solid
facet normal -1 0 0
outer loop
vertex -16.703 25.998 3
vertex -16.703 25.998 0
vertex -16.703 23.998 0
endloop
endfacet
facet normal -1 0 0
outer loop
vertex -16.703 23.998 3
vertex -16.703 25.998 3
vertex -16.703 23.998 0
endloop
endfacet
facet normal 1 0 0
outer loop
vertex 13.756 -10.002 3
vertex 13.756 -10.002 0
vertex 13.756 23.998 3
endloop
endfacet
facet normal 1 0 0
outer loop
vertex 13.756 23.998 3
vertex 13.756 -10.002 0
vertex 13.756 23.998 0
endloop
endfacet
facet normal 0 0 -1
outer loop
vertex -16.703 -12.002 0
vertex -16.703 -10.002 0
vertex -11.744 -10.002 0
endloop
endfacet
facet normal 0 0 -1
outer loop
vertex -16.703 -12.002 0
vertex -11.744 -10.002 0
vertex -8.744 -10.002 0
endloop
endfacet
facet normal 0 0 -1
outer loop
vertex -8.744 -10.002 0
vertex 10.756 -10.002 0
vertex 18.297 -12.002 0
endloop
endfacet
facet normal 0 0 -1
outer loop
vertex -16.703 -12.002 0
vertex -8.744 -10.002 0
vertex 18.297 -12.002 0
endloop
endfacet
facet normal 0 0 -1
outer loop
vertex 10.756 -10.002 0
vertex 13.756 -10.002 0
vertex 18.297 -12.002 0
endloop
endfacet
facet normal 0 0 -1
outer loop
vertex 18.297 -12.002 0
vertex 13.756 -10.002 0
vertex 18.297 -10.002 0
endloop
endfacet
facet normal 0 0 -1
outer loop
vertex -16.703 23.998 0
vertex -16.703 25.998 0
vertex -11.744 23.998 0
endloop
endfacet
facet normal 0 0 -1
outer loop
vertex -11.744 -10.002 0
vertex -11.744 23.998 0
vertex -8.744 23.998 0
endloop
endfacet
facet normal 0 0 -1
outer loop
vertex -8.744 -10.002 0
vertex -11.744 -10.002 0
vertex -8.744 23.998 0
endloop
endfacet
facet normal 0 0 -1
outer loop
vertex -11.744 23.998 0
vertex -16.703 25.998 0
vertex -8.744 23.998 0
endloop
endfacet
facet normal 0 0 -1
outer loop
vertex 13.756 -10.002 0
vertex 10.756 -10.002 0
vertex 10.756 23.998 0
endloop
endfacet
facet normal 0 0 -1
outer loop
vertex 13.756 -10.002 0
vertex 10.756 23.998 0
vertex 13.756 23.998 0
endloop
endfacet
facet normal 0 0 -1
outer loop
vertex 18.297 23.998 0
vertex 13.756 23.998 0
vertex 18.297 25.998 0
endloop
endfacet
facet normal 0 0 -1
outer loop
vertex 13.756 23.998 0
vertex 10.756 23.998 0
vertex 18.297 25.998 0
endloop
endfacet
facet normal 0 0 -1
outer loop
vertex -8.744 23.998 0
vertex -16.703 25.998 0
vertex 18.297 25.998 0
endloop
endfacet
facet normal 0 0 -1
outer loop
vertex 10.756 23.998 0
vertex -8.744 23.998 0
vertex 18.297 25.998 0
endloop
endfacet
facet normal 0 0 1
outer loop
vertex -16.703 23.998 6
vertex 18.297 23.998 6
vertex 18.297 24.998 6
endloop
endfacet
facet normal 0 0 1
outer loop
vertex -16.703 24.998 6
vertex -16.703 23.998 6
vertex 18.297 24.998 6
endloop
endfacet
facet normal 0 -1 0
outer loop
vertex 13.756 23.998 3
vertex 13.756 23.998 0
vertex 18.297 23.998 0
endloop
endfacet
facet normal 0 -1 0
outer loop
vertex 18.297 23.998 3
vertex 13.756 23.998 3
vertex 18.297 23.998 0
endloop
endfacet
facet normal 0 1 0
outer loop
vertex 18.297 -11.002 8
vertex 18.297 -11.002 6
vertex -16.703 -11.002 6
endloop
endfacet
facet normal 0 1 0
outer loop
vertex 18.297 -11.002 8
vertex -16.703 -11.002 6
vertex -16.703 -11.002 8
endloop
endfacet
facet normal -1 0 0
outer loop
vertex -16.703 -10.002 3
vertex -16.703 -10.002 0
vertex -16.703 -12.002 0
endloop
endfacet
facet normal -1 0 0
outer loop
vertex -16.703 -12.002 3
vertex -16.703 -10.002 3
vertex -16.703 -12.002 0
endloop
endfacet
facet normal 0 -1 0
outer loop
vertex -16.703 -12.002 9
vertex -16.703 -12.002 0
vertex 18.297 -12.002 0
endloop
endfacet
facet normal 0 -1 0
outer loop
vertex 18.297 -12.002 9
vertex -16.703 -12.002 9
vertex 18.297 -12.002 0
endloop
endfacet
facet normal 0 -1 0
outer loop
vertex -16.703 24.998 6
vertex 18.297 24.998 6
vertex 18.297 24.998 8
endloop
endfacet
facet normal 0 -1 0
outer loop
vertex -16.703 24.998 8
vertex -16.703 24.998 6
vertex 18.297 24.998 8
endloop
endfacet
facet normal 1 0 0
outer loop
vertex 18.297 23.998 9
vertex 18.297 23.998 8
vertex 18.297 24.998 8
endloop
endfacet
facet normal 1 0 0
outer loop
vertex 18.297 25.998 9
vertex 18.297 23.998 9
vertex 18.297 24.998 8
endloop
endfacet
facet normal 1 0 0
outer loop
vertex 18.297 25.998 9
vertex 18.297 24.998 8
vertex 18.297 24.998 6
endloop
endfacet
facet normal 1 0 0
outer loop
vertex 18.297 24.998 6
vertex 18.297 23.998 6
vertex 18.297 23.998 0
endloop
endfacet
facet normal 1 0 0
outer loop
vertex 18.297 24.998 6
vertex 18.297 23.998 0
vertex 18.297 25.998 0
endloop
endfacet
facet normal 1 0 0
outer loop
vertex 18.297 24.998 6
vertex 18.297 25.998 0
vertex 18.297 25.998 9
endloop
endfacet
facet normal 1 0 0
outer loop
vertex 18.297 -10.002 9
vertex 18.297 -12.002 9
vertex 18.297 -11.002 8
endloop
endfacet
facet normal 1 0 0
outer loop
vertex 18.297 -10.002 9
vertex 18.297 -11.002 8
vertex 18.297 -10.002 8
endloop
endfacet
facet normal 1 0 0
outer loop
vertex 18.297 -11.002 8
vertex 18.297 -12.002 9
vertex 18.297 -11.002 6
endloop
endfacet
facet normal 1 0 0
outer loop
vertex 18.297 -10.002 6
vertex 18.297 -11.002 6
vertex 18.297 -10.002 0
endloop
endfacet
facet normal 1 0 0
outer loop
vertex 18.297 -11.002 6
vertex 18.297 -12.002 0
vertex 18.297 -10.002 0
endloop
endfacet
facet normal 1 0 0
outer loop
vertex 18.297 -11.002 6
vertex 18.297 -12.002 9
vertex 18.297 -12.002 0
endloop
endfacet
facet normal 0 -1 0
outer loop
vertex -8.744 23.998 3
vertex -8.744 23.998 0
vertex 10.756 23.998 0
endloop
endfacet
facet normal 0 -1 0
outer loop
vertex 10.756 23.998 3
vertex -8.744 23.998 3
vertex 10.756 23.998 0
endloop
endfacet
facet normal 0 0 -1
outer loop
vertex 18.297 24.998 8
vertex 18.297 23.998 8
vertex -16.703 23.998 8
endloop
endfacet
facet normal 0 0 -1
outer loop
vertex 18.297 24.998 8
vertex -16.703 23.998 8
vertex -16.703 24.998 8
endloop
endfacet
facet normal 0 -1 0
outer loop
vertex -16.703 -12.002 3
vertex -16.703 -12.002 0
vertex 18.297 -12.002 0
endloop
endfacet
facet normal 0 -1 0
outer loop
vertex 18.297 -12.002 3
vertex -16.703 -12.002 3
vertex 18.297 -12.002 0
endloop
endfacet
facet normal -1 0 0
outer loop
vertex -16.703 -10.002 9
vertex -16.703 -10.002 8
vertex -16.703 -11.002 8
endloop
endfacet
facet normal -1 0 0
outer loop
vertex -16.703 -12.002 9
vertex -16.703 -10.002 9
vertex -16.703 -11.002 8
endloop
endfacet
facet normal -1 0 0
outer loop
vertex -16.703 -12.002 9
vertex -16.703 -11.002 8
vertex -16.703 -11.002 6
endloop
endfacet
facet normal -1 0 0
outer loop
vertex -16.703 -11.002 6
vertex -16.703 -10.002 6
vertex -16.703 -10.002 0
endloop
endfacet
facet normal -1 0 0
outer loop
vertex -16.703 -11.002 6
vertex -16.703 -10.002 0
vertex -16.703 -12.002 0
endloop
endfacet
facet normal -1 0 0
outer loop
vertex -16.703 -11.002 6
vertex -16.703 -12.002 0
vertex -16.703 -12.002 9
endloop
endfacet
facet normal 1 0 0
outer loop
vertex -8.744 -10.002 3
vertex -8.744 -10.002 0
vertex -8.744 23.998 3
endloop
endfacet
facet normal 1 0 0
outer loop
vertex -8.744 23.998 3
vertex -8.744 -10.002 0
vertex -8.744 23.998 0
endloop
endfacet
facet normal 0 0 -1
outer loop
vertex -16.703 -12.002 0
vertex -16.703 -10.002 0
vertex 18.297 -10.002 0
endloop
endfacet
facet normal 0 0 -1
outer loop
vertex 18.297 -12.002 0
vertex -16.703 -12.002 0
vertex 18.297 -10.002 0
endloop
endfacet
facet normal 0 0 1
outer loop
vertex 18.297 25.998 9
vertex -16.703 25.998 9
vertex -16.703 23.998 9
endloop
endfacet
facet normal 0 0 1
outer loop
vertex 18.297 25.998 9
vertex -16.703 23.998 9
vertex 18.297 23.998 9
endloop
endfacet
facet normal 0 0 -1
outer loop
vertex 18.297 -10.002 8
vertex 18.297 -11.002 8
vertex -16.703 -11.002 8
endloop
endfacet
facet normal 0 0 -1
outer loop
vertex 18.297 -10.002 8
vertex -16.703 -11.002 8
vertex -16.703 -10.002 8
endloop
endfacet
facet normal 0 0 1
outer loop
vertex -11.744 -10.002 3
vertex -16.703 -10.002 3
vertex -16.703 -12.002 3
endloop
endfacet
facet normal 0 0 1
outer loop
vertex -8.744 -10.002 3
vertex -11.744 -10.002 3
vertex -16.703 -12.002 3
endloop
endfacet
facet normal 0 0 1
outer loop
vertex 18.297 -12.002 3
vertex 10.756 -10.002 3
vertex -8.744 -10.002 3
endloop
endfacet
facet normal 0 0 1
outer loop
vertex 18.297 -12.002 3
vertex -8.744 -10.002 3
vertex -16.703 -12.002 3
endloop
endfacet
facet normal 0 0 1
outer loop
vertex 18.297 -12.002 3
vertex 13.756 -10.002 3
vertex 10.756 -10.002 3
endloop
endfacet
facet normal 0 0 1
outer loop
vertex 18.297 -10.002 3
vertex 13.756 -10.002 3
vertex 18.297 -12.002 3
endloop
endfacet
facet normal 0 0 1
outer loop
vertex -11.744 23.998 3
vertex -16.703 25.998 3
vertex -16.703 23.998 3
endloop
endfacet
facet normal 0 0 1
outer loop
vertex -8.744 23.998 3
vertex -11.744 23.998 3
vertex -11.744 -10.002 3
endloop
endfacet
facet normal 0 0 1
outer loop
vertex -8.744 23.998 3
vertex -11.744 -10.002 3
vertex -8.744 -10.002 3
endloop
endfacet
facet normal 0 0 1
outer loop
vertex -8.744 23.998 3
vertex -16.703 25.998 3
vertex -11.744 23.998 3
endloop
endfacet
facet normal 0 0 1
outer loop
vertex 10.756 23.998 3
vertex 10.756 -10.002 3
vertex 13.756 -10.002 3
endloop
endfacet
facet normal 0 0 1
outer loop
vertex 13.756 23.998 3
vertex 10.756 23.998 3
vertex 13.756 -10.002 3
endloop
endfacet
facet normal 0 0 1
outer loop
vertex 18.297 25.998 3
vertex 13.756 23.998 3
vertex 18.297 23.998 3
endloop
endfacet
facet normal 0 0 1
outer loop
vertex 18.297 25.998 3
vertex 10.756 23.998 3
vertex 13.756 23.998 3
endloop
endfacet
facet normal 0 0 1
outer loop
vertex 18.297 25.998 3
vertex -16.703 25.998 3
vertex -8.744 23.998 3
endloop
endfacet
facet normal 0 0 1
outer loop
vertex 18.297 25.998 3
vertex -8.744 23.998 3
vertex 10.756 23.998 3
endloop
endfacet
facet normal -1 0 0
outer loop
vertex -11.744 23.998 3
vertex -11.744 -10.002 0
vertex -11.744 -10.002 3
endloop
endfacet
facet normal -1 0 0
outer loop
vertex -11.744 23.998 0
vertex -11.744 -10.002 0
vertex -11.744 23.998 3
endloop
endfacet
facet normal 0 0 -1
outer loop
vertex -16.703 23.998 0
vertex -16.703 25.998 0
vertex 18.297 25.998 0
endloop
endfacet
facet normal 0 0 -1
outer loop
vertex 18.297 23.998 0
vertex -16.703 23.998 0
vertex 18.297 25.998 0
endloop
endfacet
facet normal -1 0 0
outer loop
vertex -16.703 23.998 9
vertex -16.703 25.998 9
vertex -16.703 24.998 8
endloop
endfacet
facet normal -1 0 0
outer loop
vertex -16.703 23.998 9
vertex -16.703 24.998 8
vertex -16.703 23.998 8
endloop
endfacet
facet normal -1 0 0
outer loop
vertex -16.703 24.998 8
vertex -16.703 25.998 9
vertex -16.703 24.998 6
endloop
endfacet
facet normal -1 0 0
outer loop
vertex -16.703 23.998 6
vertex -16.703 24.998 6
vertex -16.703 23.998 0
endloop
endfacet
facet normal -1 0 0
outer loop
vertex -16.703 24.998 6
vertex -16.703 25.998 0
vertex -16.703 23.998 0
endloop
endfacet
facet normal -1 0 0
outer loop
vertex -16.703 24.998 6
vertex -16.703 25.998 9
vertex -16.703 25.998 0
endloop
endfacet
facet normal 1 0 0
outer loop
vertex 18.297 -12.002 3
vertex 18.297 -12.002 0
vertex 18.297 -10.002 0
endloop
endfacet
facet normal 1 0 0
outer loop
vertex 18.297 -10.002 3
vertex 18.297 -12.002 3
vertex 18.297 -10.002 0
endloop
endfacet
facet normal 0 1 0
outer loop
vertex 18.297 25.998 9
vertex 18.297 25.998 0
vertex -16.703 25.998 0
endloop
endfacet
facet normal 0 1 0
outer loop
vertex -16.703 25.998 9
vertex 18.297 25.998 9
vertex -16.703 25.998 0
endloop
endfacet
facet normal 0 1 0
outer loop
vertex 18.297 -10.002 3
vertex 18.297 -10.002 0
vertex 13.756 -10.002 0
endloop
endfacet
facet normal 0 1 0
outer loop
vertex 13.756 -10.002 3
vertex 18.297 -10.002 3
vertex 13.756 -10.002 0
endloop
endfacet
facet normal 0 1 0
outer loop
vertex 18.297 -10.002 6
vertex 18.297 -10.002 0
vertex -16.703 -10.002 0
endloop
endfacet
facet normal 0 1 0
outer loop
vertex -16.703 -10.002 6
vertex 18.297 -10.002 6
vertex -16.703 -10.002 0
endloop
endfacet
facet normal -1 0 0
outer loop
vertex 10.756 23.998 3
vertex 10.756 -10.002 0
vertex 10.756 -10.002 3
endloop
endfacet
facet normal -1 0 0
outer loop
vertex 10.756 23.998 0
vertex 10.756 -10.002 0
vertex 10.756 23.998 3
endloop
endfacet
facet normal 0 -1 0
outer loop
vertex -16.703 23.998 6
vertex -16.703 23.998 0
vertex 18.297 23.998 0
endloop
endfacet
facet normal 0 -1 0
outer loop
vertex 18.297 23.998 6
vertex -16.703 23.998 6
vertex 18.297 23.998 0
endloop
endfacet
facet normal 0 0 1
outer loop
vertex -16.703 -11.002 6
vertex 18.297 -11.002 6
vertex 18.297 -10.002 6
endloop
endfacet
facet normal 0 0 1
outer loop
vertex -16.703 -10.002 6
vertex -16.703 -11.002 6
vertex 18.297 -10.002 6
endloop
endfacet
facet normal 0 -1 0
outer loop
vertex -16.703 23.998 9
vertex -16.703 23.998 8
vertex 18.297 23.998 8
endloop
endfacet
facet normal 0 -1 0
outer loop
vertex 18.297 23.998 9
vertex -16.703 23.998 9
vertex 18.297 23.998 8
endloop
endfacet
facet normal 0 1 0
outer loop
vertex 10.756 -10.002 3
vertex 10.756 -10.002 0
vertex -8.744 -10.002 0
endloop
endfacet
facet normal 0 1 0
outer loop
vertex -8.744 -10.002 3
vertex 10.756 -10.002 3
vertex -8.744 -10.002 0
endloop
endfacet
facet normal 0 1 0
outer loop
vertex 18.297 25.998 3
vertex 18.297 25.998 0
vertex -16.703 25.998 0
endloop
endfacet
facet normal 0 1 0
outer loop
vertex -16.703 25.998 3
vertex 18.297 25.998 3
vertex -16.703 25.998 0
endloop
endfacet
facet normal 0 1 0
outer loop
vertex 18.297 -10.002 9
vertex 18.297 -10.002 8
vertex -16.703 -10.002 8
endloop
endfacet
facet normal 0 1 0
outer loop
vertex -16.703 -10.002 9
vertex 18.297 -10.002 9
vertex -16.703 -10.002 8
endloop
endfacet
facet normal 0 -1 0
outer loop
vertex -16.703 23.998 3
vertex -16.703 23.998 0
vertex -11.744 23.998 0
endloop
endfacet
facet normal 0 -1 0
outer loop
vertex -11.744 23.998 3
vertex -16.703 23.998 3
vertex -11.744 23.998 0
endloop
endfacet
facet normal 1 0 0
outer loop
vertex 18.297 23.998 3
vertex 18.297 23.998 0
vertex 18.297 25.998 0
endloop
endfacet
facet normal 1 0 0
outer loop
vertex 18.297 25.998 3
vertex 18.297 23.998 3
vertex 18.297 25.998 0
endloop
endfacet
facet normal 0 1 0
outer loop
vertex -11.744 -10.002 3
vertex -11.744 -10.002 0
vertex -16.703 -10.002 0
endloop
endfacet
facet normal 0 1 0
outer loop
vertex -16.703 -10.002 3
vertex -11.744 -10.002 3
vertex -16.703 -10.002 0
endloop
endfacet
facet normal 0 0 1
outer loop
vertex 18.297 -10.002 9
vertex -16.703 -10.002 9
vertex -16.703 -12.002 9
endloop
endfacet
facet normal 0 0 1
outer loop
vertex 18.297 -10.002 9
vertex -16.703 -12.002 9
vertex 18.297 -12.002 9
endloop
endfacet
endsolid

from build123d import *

# Parameters (mm, degrees)
F1_DEPTH = 9
F0_W     = 3
F0_H     = 34
F2_DEPTH = 3
F3_W     = 1
F3_H     = 2
F4_DEPTH = 35
F5_W     = 1
F5_H     = 2
F6_DEPTH = 35


with BuildPart() as f1:
    # F0 (on Top) → F1 (new body)
    with BuildSketch(Plane.XY):
        Polygon((18.296743, 25.997781), (-16.703257, 25.997781), (-16.703257, 23.997781), (-11.743939, 23.997781), (-8.743939, 23.997781), (10.756061, 23.997781), (13.756061, 23.997781), (18.296743, 23.997781), align=None)
        Polygon((-8.743939, -10.002219), (-11.743939, -10.002219), (-16.703257, -10.002219), (-16.703257, -12.002219), (18.296743, -12.002219), (18.296743, -10.002219), (13.756061, -10.002219), (10.756061, -10.002219), align=None)
    extrude(amount=F1_DEPTH)

    # F3 (on face) → F4 (cut)
    with BuildSketch(Plane.YZ.offset(18.296743)):
        with Locations((-10.502219, 7)):
            Rectangle(F3_W, F3_H)
    extrude(amount=-F4_DEPTH, mode=Mode.SUBTRACT)

    # F5 (on face) → F6 (cut)
    with BuildSketch(Plane.YZ.offset(18.296743)):
        with Locations((24.497781, 7)):
            Rectangle(F5_W, F5_H)
    extrude(amount=-F6_DEPTH, mode=Mode.SUBTRACT)


with BuildPart() as f2:
    # F0 (on Top) → F2 (new body)
    with BuildSketch(Plane.XY):
        Polygon((18.296743, 25.997781), (-16.703257, 25.997781), (-16.703257, 23.997781), (-11.743939, 23.997781), (-8.743939, 23.997781), (10.756061, 23.997781), (13.756061, 23.997781), (18.296743, 23.997781), align=None)
        with Locations((-10.243939, 6.997781)):
            Rectangle(F0_W, F0_H)
        with Locations((12.256061, 6.997781)):
            Rectangle(F0_W, F0_H)
        Polygon((-8.743939, -10.002219), (-11.743939, -10.002219), (-16.703257, -10.002219), (-16.703257, -12.002219), (18.296743, -12.002219), (18.296743, -10.002219), (13.756061, -10.002219), (10.756061, -10.002219), align=None)
    extrude(amount=F2_DEPTH)


solid = Compound([f1.part, f2.part])
